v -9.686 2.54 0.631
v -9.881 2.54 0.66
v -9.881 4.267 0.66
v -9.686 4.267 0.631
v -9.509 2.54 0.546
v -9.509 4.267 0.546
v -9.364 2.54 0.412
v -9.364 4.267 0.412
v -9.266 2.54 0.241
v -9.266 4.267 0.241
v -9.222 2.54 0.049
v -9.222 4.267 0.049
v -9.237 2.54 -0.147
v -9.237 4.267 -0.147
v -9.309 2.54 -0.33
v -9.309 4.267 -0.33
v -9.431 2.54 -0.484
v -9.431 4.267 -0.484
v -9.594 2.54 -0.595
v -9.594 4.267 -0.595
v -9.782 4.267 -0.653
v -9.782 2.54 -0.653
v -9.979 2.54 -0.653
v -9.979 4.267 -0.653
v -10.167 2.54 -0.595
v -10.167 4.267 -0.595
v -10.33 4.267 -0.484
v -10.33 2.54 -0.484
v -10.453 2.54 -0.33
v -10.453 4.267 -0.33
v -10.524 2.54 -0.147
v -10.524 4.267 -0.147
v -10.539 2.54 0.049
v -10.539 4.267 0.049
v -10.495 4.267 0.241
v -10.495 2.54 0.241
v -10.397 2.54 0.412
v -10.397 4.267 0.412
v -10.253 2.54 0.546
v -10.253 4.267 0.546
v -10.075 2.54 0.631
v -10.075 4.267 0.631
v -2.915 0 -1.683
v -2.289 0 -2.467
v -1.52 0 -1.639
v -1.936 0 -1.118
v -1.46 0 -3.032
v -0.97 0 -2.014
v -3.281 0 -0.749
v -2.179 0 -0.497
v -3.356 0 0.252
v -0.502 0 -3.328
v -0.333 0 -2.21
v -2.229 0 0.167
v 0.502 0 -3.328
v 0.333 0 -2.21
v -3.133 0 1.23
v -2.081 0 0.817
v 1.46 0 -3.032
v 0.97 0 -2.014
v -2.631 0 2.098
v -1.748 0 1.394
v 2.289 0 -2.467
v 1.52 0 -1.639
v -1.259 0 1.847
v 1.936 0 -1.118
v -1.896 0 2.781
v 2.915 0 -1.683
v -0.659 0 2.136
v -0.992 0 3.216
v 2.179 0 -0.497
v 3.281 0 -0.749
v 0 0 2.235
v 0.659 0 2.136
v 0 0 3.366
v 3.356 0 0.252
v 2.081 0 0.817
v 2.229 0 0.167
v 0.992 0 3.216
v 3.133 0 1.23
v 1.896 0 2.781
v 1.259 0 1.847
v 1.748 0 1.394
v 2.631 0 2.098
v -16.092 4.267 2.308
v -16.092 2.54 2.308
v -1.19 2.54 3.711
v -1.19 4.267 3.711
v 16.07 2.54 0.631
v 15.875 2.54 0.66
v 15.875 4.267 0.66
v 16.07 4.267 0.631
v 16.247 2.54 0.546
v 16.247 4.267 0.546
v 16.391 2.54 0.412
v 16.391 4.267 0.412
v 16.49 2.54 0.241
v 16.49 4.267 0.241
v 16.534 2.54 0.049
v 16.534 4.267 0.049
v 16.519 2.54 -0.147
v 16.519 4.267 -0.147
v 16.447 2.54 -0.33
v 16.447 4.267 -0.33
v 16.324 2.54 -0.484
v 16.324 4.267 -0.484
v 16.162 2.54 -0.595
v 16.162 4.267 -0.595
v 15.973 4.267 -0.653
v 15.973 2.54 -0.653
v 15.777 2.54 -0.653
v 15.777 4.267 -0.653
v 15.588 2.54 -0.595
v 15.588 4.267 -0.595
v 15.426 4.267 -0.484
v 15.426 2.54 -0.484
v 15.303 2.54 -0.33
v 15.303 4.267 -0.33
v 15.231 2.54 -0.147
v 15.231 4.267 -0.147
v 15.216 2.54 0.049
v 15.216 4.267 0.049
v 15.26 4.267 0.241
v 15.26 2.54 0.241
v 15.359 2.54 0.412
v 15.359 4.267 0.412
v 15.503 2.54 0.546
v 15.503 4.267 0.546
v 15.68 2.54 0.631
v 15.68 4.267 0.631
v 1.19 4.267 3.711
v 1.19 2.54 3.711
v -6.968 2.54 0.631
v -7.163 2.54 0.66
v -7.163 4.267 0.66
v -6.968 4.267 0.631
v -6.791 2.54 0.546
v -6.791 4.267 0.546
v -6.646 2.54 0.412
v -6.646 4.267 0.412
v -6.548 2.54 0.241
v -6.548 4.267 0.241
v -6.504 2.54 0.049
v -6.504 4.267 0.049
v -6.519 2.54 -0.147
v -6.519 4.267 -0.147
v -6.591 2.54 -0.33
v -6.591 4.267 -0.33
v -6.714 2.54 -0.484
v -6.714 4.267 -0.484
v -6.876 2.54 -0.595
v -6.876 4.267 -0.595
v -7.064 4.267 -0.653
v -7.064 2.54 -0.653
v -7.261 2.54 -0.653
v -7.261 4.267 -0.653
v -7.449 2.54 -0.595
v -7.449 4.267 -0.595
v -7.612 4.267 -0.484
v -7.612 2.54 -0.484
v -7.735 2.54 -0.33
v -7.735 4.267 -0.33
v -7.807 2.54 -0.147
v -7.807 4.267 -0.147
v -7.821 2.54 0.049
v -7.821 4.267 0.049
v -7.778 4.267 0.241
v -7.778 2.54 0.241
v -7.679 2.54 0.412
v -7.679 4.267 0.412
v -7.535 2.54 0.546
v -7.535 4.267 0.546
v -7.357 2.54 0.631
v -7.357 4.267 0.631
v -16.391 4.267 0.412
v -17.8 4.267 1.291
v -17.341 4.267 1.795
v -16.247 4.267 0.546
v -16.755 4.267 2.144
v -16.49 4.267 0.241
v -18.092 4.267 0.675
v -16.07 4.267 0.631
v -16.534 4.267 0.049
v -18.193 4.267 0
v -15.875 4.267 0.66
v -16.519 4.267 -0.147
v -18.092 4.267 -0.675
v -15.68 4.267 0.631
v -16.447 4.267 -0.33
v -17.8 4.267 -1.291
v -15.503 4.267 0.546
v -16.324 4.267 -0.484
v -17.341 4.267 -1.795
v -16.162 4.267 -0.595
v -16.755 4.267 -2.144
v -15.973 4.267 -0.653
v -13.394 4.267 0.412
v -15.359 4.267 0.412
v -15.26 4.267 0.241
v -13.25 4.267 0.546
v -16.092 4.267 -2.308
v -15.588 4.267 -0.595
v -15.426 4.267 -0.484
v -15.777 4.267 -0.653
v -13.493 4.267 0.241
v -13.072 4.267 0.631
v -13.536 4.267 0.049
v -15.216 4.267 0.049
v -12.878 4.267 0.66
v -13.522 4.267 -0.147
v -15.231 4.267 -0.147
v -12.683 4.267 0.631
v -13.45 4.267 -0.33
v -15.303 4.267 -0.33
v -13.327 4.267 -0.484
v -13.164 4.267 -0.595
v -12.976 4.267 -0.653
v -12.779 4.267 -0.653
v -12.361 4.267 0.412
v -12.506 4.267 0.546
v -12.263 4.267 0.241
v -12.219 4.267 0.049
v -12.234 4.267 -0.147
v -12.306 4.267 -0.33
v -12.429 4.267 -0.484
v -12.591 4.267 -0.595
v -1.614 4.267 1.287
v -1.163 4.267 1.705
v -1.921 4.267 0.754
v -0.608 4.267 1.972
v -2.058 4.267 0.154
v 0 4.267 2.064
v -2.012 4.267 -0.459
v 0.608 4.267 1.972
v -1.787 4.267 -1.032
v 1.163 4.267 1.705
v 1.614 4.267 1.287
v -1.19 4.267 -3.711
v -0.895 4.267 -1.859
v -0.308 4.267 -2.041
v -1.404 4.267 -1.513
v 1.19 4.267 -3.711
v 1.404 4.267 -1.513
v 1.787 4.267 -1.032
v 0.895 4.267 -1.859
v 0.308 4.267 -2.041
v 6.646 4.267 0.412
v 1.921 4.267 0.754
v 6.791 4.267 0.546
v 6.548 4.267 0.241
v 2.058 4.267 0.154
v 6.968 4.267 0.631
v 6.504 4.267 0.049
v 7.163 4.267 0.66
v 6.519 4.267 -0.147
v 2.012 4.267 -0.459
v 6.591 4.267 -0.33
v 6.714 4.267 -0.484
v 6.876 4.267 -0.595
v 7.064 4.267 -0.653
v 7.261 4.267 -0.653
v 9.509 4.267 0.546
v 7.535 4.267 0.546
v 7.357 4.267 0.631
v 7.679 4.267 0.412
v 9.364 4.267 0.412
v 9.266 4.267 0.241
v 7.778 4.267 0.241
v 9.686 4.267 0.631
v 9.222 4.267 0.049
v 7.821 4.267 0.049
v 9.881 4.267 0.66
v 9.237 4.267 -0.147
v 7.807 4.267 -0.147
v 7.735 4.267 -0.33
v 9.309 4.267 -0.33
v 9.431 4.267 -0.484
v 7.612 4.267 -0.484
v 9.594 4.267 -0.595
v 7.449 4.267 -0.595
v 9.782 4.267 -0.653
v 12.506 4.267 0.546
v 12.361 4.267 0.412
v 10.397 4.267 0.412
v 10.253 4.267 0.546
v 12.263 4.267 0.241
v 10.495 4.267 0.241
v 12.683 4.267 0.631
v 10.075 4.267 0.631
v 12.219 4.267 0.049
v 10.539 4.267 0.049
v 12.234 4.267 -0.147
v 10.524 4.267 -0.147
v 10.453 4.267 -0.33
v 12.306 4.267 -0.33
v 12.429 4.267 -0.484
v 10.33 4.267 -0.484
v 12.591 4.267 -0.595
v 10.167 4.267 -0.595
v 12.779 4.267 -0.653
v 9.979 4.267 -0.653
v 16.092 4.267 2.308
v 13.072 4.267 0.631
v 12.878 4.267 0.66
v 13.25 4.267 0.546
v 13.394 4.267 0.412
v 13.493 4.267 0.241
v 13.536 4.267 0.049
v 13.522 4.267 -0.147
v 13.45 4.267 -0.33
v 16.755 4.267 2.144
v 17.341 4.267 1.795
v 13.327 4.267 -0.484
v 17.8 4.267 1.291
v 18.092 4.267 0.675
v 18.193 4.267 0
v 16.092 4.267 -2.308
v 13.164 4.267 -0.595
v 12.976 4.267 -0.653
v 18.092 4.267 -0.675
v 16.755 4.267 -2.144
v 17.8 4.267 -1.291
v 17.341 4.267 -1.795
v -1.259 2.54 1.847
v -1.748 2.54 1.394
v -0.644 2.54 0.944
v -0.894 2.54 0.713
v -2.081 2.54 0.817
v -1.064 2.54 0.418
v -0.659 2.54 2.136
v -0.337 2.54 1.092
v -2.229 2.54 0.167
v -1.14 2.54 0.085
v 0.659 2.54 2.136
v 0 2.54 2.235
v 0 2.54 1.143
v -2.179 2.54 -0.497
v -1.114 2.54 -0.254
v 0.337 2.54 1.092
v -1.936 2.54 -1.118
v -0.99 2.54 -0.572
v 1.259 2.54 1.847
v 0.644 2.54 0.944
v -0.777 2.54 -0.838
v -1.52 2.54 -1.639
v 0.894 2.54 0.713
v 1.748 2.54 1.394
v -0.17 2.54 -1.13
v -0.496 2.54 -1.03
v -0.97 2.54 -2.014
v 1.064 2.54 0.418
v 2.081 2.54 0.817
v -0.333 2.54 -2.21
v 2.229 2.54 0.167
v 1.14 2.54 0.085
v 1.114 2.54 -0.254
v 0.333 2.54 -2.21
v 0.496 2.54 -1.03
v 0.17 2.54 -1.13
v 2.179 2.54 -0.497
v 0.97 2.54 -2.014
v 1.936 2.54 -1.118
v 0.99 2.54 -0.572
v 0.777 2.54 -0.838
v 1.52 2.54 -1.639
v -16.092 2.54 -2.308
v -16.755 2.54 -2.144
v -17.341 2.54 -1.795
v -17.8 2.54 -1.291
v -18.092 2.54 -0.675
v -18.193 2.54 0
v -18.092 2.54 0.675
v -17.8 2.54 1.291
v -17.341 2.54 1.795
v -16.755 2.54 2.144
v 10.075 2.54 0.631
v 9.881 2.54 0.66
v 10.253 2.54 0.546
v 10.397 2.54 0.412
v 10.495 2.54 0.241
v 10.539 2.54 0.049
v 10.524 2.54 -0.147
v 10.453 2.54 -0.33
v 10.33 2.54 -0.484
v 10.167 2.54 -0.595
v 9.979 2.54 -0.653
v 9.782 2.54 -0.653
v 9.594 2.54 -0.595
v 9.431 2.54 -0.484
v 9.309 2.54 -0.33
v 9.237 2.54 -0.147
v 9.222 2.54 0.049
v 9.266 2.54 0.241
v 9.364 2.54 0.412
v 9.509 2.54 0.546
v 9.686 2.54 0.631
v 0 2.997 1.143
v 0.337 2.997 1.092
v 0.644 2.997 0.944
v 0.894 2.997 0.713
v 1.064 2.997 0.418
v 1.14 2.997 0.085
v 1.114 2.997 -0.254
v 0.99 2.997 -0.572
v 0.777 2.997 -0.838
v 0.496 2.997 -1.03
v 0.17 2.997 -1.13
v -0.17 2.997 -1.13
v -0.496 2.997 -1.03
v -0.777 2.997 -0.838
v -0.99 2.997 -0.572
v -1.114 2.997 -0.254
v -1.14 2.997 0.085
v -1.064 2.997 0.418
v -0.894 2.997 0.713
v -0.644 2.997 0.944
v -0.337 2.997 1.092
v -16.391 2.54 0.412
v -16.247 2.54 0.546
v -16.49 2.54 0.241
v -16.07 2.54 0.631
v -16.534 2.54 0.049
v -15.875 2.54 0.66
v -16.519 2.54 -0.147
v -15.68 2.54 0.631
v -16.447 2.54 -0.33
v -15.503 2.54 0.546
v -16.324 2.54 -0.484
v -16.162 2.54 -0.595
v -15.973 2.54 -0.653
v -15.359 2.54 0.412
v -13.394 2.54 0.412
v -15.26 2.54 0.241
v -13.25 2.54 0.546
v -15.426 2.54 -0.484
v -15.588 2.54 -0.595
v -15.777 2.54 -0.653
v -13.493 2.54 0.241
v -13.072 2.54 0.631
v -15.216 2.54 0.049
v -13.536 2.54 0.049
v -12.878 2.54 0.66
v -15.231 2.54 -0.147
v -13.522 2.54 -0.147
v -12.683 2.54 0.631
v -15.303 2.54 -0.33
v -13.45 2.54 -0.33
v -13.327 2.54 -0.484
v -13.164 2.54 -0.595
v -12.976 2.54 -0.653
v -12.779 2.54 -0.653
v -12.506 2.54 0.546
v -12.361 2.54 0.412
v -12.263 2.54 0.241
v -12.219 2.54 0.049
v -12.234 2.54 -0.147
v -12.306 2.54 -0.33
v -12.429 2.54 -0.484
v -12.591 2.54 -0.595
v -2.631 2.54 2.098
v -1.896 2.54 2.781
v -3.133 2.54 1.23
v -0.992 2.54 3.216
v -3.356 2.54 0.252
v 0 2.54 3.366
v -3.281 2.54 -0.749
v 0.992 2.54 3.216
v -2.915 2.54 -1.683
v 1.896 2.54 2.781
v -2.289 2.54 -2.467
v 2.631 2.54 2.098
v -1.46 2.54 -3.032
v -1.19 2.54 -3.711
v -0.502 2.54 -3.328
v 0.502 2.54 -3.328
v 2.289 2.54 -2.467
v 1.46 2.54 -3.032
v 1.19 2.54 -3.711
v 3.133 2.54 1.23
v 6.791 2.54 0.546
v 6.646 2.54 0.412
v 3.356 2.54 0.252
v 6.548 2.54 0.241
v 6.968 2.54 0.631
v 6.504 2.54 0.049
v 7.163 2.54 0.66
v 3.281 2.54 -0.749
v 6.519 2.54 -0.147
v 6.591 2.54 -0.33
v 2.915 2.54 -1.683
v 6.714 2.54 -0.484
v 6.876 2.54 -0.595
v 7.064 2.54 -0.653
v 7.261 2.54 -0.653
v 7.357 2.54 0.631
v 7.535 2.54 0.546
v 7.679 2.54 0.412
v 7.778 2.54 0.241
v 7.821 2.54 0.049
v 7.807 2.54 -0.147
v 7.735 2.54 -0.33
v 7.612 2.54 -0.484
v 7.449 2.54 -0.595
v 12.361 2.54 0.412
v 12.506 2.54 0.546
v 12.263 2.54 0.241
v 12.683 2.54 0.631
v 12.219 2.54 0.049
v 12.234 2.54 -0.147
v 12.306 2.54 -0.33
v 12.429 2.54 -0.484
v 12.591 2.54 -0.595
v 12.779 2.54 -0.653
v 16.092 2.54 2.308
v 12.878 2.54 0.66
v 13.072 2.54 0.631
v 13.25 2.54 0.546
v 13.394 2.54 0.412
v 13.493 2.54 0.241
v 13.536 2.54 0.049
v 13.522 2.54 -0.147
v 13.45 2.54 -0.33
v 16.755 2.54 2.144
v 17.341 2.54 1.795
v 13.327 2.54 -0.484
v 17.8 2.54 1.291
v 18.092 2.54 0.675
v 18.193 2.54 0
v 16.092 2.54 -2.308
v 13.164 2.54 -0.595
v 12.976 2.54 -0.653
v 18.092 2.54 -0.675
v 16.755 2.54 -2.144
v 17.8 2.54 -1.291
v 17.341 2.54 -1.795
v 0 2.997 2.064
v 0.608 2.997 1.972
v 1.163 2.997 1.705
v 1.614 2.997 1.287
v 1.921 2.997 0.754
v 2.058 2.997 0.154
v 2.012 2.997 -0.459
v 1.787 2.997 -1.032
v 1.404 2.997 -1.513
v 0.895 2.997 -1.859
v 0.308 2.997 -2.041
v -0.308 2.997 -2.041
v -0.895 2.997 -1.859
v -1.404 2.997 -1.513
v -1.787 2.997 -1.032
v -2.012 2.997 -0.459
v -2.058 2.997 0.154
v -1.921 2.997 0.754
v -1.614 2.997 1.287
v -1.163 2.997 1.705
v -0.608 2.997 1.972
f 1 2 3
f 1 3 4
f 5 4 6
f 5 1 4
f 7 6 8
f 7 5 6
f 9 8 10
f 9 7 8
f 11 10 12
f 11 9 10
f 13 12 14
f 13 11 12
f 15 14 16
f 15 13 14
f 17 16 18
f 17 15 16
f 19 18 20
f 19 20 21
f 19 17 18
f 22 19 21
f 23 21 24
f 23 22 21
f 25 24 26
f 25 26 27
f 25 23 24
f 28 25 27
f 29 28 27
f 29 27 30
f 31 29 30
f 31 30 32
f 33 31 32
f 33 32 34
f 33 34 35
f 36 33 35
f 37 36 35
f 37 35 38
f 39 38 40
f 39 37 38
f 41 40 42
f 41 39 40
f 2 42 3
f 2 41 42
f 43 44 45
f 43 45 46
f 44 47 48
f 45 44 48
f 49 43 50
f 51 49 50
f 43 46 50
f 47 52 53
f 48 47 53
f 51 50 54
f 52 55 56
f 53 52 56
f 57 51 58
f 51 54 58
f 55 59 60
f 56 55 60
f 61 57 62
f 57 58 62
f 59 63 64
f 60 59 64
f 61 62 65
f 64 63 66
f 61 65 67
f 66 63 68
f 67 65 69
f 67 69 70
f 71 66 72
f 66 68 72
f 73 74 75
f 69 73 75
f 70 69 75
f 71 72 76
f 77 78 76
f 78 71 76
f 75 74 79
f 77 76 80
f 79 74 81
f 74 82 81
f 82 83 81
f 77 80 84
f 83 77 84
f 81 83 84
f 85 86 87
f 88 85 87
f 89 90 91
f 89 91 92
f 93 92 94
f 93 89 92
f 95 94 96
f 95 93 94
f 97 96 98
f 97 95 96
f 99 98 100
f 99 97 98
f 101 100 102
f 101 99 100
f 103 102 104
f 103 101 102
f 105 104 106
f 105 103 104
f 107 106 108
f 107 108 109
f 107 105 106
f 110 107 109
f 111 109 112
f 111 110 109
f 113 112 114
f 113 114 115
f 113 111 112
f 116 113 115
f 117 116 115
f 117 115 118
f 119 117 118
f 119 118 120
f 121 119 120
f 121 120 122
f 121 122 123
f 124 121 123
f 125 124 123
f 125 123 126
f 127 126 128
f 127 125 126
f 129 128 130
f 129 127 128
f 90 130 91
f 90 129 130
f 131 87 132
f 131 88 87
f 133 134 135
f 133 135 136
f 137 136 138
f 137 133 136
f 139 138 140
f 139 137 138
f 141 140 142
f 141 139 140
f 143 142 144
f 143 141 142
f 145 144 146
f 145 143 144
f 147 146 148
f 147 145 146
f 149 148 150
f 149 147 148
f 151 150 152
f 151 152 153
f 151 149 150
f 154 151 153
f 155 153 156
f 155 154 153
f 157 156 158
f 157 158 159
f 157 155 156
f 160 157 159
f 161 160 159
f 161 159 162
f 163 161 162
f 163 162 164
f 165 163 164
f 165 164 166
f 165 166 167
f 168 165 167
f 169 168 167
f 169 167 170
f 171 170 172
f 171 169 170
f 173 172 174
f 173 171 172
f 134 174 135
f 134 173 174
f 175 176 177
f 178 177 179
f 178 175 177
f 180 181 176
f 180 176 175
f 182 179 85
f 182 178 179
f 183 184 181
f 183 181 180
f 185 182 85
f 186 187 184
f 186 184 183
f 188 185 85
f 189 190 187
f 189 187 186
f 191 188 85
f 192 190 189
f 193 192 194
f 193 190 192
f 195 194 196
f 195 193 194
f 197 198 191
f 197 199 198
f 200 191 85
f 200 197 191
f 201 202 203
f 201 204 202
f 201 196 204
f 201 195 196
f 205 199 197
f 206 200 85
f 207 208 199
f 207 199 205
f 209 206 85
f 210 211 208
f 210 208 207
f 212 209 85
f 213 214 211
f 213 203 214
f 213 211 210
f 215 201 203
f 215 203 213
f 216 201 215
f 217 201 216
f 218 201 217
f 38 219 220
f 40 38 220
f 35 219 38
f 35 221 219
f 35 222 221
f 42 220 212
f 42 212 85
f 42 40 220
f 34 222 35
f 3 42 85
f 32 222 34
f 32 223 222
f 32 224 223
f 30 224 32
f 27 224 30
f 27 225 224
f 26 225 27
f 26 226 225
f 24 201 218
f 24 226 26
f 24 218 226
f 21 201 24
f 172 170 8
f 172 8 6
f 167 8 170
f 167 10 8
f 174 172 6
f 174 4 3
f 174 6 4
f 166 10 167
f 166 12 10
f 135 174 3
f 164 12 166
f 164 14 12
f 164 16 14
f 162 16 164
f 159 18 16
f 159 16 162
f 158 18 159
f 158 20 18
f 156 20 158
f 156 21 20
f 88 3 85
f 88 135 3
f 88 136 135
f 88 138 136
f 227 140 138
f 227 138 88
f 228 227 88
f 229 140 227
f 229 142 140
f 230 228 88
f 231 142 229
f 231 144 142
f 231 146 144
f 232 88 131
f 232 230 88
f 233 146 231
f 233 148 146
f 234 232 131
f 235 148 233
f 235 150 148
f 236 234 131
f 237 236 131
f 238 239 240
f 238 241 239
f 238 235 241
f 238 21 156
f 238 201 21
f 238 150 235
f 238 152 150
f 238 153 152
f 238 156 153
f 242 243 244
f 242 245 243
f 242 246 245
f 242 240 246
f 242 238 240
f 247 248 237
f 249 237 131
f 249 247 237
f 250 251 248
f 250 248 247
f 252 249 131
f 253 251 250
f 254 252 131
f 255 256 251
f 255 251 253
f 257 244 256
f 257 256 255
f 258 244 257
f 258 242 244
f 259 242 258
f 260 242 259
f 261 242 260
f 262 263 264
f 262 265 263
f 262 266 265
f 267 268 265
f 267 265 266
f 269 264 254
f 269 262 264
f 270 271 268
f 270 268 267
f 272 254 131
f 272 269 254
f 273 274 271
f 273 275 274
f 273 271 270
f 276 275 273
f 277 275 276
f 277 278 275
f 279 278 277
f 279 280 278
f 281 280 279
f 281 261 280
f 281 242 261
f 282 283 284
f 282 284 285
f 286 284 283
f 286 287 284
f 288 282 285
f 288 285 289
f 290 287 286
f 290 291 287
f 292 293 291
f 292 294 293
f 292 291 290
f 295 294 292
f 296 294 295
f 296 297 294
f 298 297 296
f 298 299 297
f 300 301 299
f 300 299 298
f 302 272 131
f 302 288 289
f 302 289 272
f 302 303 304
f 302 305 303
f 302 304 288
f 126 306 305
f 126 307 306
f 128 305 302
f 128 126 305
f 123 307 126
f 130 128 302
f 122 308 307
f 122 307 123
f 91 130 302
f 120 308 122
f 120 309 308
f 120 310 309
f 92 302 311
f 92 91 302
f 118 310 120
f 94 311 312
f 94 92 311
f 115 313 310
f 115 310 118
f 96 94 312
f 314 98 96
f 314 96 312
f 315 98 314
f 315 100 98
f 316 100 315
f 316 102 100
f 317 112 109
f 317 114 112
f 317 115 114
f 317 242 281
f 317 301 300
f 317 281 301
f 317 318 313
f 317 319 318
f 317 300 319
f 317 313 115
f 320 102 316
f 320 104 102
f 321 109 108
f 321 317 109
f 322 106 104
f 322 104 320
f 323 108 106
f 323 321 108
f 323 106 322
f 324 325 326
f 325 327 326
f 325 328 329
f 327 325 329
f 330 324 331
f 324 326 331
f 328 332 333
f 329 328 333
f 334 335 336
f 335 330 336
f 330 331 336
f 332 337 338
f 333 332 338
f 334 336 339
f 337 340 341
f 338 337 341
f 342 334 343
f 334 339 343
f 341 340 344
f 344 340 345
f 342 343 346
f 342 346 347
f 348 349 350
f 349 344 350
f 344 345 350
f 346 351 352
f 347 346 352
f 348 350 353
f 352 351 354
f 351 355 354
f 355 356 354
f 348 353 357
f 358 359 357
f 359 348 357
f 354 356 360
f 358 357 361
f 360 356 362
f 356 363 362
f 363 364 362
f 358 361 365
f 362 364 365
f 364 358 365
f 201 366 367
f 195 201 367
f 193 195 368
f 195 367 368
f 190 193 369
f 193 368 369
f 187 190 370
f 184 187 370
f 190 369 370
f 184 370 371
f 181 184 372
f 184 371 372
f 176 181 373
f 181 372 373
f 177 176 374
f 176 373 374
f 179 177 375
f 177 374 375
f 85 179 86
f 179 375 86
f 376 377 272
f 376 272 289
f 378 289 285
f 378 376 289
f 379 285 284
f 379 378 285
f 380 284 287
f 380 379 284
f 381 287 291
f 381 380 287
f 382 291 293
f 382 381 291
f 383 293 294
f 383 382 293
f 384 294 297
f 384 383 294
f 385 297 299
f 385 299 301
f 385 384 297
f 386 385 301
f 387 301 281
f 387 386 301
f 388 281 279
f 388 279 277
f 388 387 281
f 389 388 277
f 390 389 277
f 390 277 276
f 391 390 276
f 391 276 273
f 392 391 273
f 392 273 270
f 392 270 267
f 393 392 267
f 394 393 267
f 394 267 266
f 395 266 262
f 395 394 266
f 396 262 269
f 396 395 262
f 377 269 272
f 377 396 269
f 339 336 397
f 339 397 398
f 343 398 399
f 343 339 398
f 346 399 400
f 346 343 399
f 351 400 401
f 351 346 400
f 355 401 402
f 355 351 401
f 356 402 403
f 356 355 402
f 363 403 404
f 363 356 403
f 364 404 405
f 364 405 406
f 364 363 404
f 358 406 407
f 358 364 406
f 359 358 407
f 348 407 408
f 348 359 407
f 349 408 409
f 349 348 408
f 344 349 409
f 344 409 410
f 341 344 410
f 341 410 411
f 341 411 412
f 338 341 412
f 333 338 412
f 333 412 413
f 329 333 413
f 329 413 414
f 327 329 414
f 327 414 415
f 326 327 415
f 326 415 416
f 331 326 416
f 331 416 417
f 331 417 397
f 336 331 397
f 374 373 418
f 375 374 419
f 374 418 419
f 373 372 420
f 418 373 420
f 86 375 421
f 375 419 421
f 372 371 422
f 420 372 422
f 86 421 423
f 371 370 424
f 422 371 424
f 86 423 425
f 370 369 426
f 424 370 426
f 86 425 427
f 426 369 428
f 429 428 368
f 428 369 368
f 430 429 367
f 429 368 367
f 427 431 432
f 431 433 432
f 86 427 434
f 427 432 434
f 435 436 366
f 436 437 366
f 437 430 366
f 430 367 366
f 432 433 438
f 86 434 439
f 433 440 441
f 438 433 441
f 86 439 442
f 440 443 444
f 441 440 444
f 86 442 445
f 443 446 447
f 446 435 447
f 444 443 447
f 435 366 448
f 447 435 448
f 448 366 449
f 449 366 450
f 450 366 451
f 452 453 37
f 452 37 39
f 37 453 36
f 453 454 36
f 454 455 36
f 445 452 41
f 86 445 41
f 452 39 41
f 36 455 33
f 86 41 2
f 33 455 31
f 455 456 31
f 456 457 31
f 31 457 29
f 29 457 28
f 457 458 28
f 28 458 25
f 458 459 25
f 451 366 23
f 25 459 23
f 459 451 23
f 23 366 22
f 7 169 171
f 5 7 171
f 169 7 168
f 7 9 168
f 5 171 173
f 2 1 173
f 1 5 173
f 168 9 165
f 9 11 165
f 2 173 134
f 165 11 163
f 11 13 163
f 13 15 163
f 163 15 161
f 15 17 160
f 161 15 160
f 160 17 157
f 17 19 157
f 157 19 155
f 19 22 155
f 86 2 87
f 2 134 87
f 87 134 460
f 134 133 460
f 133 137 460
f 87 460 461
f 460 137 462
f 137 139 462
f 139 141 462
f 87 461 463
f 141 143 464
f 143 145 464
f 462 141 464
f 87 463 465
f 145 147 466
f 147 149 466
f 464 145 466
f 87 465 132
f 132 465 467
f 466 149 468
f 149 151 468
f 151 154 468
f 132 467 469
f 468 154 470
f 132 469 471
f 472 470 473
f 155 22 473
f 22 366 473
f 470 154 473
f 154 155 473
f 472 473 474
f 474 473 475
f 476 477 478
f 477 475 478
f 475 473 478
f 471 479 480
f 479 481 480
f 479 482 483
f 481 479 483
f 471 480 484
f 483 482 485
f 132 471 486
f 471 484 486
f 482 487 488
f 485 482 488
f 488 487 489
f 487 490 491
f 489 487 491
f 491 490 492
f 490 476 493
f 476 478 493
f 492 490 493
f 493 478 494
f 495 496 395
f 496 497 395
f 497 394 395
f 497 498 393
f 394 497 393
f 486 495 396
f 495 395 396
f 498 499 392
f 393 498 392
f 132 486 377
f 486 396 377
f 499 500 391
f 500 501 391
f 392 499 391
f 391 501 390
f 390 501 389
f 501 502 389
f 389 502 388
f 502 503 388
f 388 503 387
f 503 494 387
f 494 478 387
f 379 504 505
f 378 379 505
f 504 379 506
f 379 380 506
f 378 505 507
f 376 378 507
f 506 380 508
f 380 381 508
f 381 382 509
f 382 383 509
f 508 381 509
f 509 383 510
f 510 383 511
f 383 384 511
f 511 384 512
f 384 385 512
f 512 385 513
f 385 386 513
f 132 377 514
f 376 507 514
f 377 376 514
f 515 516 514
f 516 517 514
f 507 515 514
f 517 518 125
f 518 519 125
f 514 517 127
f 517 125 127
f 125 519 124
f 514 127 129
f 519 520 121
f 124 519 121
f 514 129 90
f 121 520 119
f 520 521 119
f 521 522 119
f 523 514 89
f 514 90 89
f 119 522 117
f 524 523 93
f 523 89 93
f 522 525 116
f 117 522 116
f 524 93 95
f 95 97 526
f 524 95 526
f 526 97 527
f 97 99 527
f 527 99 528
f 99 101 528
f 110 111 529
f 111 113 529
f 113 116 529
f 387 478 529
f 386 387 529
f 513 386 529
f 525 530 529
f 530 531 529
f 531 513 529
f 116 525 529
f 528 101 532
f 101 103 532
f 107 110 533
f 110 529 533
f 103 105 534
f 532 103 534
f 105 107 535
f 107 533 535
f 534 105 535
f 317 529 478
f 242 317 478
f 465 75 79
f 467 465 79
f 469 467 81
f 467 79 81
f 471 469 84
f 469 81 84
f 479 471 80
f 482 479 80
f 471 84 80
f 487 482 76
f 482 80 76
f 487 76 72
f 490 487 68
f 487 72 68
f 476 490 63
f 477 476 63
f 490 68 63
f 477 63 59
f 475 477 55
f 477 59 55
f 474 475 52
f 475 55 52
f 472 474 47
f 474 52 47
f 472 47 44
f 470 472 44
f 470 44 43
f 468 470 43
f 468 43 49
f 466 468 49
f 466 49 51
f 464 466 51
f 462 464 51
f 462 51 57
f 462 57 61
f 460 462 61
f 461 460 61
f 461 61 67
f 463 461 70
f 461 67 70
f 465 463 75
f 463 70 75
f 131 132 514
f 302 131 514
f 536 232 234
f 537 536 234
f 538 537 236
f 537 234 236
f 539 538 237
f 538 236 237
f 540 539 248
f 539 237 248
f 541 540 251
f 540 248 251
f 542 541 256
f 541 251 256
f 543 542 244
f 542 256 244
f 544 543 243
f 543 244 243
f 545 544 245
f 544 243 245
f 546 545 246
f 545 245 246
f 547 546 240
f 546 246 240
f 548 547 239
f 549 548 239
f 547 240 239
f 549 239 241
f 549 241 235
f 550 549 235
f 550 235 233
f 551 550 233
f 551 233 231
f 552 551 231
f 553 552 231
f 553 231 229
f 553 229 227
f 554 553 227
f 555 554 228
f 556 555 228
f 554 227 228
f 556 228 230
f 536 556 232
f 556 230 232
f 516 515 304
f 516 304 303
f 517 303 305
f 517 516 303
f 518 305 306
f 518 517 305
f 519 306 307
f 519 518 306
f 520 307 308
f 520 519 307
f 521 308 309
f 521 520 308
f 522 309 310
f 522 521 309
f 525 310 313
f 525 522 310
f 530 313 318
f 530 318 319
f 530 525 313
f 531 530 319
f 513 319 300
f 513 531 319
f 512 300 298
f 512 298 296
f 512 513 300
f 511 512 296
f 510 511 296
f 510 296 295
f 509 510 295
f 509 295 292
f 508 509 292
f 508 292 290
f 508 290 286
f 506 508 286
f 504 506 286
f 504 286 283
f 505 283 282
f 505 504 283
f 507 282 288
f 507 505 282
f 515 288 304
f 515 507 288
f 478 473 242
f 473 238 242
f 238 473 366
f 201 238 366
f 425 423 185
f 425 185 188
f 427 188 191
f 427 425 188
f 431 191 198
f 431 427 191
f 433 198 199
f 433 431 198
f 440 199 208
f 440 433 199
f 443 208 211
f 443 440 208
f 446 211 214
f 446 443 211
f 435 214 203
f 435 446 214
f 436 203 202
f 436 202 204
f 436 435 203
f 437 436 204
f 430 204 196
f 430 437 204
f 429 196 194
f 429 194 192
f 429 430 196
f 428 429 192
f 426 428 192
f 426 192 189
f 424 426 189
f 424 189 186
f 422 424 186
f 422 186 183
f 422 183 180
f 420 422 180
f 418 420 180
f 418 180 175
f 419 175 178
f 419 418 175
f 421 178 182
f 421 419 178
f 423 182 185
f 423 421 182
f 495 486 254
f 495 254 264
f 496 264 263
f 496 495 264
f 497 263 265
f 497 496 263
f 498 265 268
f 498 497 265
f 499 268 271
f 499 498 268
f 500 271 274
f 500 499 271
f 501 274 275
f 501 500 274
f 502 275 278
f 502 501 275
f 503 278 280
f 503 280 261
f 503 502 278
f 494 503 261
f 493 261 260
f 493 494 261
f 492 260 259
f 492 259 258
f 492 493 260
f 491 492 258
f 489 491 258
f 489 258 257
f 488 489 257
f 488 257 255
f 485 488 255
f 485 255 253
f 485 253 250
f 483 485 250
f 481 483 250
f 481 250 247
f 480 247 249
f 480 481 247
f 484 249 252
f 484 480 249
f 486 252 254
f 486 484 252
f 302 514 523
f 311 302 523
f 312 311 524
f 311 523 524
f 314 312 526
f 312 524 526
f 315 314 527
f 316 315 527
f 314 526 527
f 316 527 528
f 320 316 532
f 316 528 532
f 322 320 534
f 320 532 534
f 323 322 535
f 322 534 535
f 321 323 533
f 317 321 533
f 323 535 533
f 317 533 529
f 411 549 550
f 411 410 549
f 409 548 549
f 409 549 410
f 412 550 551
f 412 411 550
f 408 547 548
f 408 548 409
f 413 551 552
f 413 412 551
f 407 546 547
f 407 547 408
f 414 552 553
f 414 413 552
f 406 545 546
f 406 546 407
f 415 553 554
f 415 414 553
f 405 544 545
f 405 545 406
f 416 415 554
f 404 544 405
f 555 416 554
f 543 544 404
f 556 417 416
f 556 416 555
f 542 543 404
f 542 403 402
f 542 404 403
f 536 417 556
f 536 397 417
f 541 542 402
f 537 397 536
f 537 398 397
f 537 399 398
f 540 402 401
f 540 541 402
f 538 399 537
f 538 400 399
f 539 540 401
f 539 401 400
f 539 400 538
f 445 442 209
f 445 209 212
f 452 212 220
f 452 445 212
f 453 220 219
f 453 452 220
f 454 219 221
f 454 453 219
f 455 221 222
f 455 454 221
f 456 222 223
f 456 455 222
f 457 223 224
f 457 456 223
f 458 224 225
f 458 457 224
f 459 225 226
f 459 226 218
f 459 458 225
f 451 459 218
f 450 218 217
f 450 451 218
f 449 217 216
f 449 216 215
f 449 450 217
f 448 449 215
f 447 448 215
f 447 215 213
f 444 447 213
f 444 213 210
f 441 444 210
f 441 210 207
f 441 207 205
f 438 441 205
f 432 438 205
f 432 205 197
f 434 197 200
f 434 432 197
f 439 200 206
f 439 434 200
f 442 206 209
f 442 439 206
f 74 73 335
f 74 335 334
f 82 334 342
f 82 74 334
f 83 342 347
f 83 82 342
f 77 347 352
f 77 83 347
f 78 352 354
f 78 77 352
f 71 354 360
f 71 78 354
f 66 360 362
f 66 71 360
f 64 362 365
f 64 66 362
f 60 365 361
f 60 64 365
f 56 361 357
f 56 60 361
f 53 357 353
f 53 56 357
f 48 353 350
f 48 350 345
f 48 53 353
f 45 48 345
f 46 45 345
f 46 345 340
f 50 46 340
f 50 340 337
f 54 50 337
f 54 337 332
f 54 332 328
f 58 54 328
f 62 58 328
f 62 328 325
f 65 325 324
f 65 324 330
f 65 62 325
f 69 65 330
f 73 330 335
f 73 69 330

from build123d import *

# Parameters (mm, degrees)
SKETCH1_R           = 3.3655
SKETCH1_R_2         = 2.2352
BOSS_EXTRUDE1_DEPTH = 2.54
SKETCH2_R           = 0.6604
SKETCH2_R_2         = 2.31775
SKETCH2_R_3         = 3.3655
SKETCH2_R_4         = 2.2352
SKETCH2_R_5         = 1.143
BOSS_EXTRUDE2_DEPTH = 1.7272
FILLET1_R           = 12.7
SKETCH3_R           = 2.06375
SKETCH3_R_2         = 1.143
CUT_EXTRUDE1_DEPTH  = 1.27


with BuildPart() as part:
    # Sketch1 → Boss-Extrude1 (new body)
    with BuildSketch(Plane(origin=(0, 0, 0), x_dir=(1, 0, 0), z_dir=(0, 1, 0))):
        with Locations(Location((0, 0, 0), (0, 0, 270))):
            Circle(SKETCH1_R)
        with Locations(Location((0, 0, 0), (0, 0, 270))):
            Circle(SKETCH1_R_2, mode=Mode.SUBTRACT)
    extrude(amount=BOSS_EXTRUDE1_DEPTH)

    # Sketch2 → Boss-Extrude2 (add)
    with BuildSketch(Plane(origin=(0, 2.54, 0), x_dir=(1, 0, 0), z_dir=(0, 1, 0))):
        with BuildLine():
            ThreePointArc((-0.713521748, -3.755518873), (-3.8227, 0), (-0.713521748, 3.755518873))
            Line((-0.713521748, 3.755518873), (-16.092265178, 2.307544345))
            ThreePointArc((-16.092265178, 2.307544345), (-14.314807913, 1.713991165), (-13.55725, 0))
            ThreePointArc((-13.55725, 0), (-14.314807913, -1.713991165), (-16.092265178, -2.307544345))
            Line((-16.092265178, -2.307544345), (-0.713521748, -3.755518873))
        make_face()
        with Locations(Location((-12.8778, 0, 0), (0, 0, 270))):
            Circle(SKETCH2_R, mode=Mode.SUBTRACT)
        with Locations(Location((-9.8806, 0, 0), (0, 0, 270))):
            Circle(SKETCH2_R, mode=Mode.SUBTRACT)
        with Locations(Location((-7.1628, 0, 0), (0, 0, 270))):
            Circle(SKETCH2_R, mode=Mode.SUBTRACT)
        with Locations((-15.875, 0)):
            Circle(SKETCH2_R_2)
        with Locations(Location((-15.875, 0, 0), (0, 0, 270))):
            Circle(SKETCH2_R, mode=Mode.SUBTRACT)
        with BuildLine():
            Line((16.092265178, 2.307544345), (0.713521748, 3.755518873))
            ThreePointArc((0.713521748, 3.755518873), (2.944538578, 2.437771083), (3.8227, 0))
            ThreePointArc((3.8227, 0), (2.944538578, -2.437771083), (0.713521748, -3.755518873))
            Line((0.713521748, -3.755518873), (16.092265178, -2.307544345))
            ThreePointArc((16.092265178, -2.307544345), (13.55725, 0), (16.092265178, 2.307544345))
        make_face()
        with Locations(Location((7.1628, 0, 0), (0, 0, 270))):
            Circle(SKETCH2_R, mode=Mode.SUBTRACT)
        with Locations(Location((9.8806, 0, 0), (0, 0, 270))):
            Circle(SKETCH2_R, mode=Mode.SUBTRACT)
        with Locations(Location((12.8778, 0, 0), (0, 0, 270))):
            Circle(SKETCH2_R, mode=Mode.SUBTRACT)
        with Locations((15.875, 0)):
            Circle(SKETCH2_R_2)
        with Locations(Location((15.875, 0, 0), (0, 0, 270))):
            Circle(SKETCH2_R, mode=Mode.SUBTRACT)
        with BuildLine():
            Line((0.713521748, 3.755518873), (0, 3.8227))
            Line((0, 3.8227), (-0.713521748, 3.755518873))
            ThreePointArc((-0.713521748, 3.755518873), (-3.8227, 0), (-0.713521748, -3.755518873))
            Line((-0.713521748, -3.755518873), (0, -3.8227))
            Line((0, -3.8227), (0.713521748, -3.755518873))
            ThreePointArc((0.713521748, -3.755518873), (2.944538578, -2.437771083), (3.8227, 0))
            ThreePointArc((3.8227, 0), (2.944538578, 2.437771083), (0.713521748, 3.755518873))
        make_face()
        with Locations(Location((0, 0, 0), (0, 0, 270))):
            Circle(SKETCH2_R_3, mode=Mode.SUBTRACT)
        with Locations(Location((0, 0, 0), (0, 0, 270))):
            Circle(SKETCH2_R_3)
        with Locations(Location((0, 0, 0), (0, 0, 270))):
            Circle(SKETCH2_R_4, mode=Mode.SUBTRACT)
        with Locations(Location((0, 0, 0), (0, 0, 270))):
            Circle(SKETCH2_R_4)
        with Locations(Location((0, 0, 0), (0, 0, 270))):
            Circle(SKETCH2_R_5, mode=Mode.SUBTRACT)
    extrude(amount=BOSS_EXTRUDE2_DEPTH)

    # Fillet1
    fillet1_edges = [part.edges().sort_by_distance(p)[0] for p in [
        (0, 3.4036, -3.8227),
        (0, 3.4036, 3.8227),
    ]]
    fillet(fillet1_edges, radius=FILLET1_R)

    # Sketch3 → Cut-Extrude1 (cut)
    with BuildSketch(Plane(origin=(0, 4.2672, 0), x_dir=(1, 0, 0), z_dir=(0, 1, 0))):
        with Locations(Location((0, 0, 0), (0, 0, 270))):
            Circle(SKETCH3_R)
        with Locations(Location((0, 0, 0), (0, 0, 270))):
            Circle(SKETCH3_R_2, mode=Mode.SUBTRACT)
    extrude(amount=-CUT_EXTRUDE1_DEPTH, mode=Mode.SUBTRACT)


solid = part.part
